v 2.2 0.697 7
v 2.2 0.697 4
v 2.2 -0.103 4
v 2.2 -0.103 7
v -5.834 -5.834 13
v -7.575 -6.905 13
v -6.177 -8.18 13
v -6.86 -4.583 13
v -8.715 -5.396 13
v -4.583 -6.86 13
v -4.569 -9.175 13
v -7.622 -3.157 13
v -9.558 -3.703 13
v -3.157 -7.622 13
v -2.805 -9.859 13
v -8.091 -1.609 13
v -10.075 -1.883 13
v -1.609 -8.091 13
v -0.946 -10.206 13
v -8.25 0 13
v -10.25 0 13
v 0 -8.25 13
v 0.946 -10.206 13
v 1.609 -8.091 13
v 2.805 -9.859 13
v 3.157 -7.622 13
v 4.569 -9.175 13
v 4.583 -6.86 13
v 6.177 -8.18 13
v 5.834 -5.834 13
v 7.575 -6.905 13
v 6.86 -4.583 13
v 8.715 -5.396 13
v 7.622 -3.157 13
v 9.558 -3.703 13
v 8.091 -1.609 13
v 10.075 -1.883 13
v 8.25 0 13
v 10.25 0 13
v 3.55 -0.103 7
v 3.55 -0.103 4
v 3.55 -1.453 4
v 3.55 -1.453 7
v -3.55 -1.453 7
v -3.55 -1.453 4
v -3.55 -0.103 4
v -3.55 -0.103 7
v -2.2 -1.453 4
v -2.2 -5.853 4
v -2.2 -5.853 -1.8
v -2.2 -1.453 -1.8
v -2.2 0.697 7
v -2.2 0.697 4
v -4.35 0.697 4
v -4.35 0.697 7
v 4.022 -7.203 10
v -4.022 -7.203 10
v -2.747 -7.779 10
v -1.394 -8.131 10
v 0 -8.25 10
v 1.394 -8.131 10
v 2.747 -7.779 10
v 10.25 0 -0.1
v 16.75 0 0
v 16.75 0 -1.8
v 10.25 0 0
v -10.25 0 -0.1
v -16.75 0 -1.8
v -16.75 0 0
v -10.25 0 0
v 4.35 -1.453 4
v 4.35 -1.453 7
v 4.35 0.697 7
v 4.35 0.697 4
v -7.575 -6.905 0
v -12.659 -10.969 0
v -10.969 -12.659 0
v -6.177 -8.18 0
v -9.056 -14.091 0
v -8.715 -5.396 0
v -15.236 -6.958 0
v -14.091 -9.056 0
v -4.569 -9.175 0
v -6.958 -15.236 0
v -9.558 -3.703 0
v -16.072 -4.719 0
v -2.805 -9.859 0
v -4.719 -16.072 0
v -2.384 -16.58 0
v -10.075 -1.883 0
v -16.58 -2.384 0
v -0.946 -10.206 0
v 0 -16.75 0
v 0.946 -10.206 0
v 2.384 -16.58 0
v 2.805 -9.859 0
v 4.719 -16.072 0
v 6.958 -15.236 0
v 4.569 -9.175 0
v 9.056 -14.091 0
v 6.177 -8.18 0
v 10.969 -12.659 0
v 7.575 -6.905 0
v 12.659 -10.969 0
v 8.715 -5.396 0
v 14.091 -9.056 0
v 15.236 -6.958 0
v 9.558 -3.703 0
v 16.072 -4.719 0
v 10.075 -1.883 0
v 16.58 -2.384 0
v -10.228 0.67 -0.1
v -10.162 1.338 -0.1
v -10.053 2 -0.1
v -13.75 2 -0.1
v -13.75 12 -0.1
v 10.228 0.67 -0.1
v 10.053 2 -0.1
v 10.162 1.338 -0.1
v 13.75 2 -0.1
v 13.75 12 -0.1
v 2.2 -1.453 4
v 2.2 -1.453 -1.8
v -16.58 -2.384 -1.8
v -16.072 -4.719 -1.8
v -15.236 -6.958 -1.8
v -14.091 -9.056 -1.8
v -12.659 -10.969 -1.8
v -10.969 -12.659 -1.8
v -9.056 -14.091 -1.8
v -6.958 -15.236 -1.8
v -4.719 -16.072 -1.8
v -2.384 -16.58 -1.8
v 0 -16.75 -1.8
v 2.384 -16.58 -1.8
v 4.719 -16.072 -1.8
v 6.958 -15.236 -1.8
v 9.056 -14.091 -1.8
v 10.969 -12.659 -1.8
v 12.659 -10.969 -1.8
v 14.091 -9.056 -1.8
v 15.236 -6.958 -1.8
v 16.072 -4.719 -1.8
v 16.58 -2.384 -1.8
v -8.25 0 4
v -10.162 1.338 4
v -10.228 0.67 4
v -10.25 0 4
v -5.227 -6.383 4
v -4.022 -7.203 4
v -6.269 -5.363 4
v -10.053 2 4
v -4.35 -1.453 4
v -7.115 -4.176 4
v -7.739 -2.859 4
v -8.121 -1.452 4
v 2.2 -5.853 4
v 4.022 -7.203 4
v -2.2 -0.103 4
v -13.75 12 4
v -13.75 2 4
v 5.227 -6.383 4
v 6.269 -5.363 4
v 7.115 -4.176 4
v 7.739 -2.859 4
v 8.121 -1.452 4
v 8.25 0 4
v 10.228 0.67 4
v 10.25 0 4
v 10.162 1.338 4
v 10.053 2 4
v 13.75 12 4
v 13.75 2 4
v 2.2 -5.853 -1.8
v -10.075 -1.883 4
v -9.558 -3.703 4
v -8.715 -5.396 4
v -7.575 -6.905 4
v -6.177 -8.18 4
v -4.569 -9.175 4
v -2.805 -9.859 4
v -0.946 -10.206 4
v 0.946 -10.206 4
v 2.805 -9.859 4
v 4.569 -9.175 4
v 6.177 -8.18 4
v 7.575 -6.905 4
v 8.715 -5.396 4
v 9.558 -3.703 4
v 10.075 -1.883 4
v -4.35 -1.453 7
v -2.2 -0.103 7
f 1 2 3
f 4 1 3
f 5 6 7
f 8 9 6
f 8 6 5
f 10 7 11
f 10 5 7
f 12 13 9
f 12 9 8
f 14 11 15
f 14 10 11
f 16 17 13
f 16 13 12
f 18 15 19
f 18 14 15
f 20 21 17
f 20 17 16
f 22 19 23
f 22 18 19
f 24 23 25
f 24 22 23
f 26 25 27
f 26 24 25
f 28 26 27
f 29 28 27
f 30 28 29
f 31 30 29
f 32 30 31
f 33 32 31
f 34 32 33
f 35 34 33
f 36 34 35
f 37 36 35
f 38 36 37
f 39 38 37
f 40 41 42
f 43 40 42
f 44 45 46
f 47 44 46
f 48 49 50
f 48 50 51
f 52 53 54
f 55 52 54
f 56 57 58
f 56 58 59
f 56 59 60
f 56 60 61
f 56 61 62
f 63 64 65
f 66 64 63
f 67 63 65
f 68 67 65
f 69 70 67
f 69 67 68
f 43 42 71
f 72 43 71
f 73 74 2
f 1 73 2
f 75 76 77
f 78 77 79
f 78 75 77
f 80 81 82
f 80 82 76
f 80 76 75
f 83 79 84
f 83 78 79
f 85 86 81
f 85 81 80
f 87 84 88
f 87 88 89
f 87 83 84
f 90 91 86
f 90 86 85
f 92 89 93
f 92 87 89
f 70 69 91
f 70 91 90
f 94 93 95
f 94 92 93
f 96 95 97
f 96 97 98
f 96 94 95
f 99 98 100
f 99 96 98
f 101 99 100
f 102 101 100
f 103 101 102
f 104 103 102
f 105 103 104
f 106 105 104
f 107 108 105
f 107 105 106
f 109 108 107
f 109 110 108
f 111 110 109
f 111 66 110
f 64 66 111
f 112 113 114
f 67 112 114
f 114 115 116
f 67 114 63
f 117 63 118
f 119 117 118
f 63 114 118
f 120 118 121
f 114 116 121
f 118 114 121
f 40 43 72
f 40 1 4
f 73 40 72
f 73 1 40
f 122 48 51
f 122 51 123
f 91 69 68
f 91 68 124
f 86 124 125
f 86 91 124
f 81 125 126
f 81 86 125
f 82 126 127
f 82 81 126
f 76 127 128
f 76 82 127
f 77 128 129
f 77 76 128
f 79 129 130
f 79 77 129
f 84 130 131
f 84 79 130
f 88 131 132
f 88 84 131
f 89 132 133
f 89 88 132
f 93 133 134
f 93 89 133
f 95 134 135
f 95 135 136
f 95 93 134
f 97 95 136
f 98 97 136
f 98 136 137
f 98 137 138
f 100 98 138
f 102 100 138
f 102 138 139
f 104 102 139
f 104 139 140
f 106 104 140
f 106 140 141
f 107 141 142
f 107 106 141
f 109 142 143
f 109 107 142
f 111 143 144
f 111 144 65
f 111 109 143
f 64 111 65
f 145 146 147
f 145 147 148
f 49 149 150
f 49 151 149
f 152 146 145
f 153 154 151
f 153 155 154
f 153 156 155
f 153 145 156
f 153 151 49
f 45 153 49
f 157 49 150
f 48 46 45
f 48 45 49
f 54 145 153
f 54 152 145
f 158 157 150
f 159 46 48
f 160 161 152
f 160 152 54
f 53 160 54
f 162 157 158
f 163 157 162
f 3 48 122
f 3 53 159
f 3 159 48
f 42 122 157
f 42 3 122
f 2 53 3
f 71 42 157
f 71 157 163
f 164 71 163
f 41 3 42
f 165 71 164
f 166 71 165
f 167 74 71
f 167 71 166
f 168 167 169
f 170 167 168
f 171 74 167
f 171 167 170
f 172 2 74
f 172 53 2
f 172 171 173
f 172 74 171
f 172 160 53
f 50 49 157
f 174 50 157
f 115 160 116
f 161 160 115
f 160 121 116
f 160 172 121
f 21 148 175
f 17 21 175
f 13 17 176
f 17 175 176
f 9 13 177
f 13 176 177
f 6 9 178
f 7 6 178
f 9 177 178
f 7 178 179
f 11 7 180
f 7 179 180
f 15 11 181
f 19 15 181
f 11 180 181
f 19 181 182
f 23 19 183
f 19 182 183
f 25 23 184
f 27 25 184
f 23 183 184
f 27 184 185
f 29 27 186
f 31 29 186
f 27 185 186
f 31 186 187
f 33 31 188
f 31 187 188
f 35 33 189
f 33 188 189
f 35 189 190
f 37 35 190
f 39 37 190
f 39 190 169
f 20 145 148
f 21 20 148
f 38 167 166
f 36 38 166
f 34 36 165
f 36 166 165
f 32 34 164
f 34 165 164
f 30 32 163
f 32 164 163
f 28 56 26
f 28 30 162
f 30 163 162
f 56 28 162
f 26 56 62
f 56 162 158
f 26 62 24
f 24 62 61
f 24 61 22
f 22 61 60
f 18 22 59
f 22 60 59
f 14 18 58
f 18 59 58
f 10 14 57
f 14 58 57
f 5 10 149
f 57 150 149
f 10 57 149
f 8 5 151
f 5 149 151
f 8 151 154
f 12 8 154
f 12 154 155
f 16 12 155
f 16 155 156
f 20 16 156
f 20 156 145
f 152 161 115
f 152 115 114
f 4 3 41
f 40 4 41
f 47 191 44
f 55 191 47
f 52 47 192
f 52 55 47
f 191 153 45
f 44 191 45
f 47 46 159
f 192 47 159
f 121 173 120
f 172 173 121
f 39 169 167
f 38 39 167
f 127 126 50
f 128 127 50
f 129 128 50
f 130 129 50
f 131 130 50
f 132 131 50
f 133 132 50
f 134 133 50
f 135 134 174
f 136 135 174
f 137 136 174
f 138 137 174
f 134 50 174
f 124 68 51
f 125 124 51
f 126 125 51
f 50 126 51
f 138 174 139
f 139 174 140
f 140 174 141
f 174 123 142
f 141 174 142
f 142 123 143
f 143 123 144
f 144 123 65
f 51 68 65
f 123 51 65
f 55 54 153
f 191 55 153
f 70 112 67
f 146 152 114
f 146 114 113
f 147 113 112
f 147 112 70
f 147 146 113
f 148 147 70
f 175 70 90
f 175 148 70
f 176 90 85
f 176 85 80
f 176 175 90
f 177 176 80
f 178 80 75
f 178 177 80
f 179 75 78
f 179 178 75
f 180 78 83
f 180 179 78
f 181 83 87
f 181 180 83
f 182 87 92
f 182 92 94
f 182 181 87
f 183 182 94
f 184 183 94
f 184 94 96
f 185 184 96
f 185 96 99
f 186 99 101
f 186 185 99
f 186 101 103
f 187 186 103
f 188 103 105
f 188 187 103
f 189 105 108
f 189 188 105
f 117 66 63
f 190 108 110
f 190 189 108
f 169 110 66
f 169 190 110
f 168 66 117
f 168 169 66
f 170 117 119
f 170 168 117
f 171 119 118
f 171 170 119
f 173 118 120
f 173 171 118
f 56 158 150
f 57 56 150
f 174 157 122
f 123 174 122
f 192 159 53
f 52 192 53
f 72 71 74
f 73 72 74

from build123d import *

# Parameters (mm, degrees)
F1_DEPTH      = 1.8
F2_DEPTH      = 4
F2_DEPTH_BACK = 0.1
F3_DEPTH      = 13
F3_DEPTH_BACK = 1.7
F4_W          = 4.4
F4_H          = 4.4
F5_DEPTH      = 10
F6_DEPTH      = 3
F7_DEPTH      = 6


with BuildPart() as f1:
    # F0 (on Top) → F1 (new body)
    with BuildSketch(Plane.XY):
        with BuildLine():
            Line((-13.75, 0), (-16.75, 0))
            ThreePointArc((-16.75, 0), (0, -16.75), (16.75, 0))
            Line((16.75, 0), (13.75, 0))
            Line((13.75, 0), (10.25, 0))
            ThreePointArc((10.25, 0), (0, -10.25), (-10.25, 0))
            Line((-10.25, 0), (-13.75, 0))
        make_face()
        with BuildLine():
            Line((-8.25, 0), (-10.25, 0))
            ThreePointArc((-10.25, 0), (0, -10.25), (10.25, 0))
            Line((10.25, 0), (8.25, 0))
            ThreePointArc((8.25, 0), (0, -8.25), (-8.25, 0))
        make_face()
        with BuildLine():
            Line((8.25, 0), (-8.25, 0))
            ThreePointArc((-8.25, 0), (0, -8.25), (8.25, 0))
        make_face()
    extrude(amount=-F1_DEPTH)

    # F0 (on Top) → F2 (join, two sides)
    with BuildSketch(Plane.XY) as f2_sk:
        with BuildLine():
            ThreePointArc((11.6859958925, 12), (12.7761141335, 10.8320546365), (13.75, 9.5655632349))
            Line((13.75, 9.5655632349), (13.75, 12))
            Line((13.75, 12), (11.6859958925, 12))
        make_face()
        with BuildLine():
            ThreePointArc((-10.0529846314, 2), (-10.2006272472, 1.0048401683), (-10.25, 0))
            Line((-10.25, 0), (-8.25, 0))
            ThreePointArc((-8.25, 0), (-8.1882451935, 1.0075418854), (-8.0039052968, 2))
            Line((-8.0039052968, 2), (-10.0529846314, 2))
        make_face()
        with BuildLine():
            ThreePointArc((-8.0039052968, 2), (-8.1882451935, 1.0075418854), (-8.25, 0))
            Line((-8.25, 0), (8.25, 0))
            ThreePointArc((8.25, 0), (8.1882451935, 1.0075418854), (8.0039052968, 2))
            Line((8.0039052968, 2), (-8.0039052968, 2))
        make_face()
        with BuildLine():
            Line((8.25, 0), (10.25, 0))
            ThreePointArc((10.25, 0), (10.2006272472, 1.0048401683), (10.0529846314, 2))
            Line((10.0529846314, 2), (8.0039052968, 2))
            ThreePointArc((8.0039052968, 2), (8.1882451935, 1.0075418854), (8.25, 0))
        make_face()
        with BuildLine():
            ThreePointArc((-11.6859958925, 12), (-12.7761141335, 10.8320546365), (-13.75, 9.5655632349))
            Line((-13.75, 9.5655632349), (-13.75, 2))
            Line((-13.75, 2), (-10.0529846314, 2))
            ThreePointArc((-10.0529846314, 2), (0, 10.25), (10.0529846314, 2))
            Line((10.0529846314, 2), (13.75, 2))
            Line((13.75, 2), (13.75, 9.5655632349))
            ThreePointArc((13.75, 9.5655632349), (12.7761141335, 10.8320546365), (11.6859958925, 12))
            Line((11.6859958925, 12), (-11.6859958925, 12))
        make_face()
        with BuildLine():
            Line((8.25, 0), (-8.25, 0))
            ThreePointArc((-8.25, 0), (0, -8.25), (8.25, 0))
        make_face()
        with BuildLine():
            Line((-8.25, 0), (-10.25, 0))
            ThreePointArc((-10.25, 0), (0, -10.25), (10.25, 0))
            Line((10.25, 0), (8.25, 0))
            ThreePointArc((8.25, 0), (0, -8.25), (-8.25, 0))
        make_face()
        with BuildLine():
            ThreePointArc((10.0529846314, 2), (0, 10.25), (-10.0529846314, 2))
            Line((-10.0529846314, 2), (-8.0039052968, 2))
            ThreePointArc((-8.0039052968, 2), (0, 8.25), (8.0039052968, 2))
            Line((8.0039052968, 2), (10.0529846314, 2))
        make_face()
        with BuildLine():
            ThreePointArc((8.0039052968, 2), (0, 8.25), (-8.0039052968, 2))
            Line((-8.0039052968, 2), (8.0039052968, 2))
        make_face()
        with BuildLine():
            Line((-13.75, 12), (-13.75, 9.5655632349))
            ThreePointArc((-13.75, 9.5655632349), (-12.7761141335, 10.8320546365), (-11.6859958925, 12))
            Line((-11.6859958925, 12), (-13.75, 12))
        make_face()
    extrude(amount=F2_DEPTH)
    extrude(f2_sk.sketch, amount=-F2_DEPTH_BACK)

    # F0 (on Top) → F3 (join, two sides)
    with BuildSketch(Plane.XY) as f3_sk:
        with BuildLine():
            Line((-8.25, 0), (-10.25, 0))
            ThreePointArc((-10.25, 0), (0, -10.25), (10.25, 0))
            Line((10.25, 0), (8.25, 0))
            ThreePointArc((8.25, 0), (0, -8.25), (-8.25, 0))
        make_face()
    extrude(amount=F3_DEPTH)
    extrude(f3_sk.sketch, amount=-F3_DEPTH_BACK)

    # F4 (on face) → F5 (cut)
    with BuildSketch(Plane.XY.offset(4)):
        with Locations((0, -3.653314048)):
            Rectangle(F4_W, F4_H)
    extrude(amount=-F5_DEPTH, mode=Mode.SUBTRACT)

    # F4 (on face) → F6 (join)
    with BuildSketch(Plane.XY.offset(4)):
        Polygon((-3.55, -0.103314048), (-2.2, -0.103314048), (-2.2, 0.696685952), (-4.35, 0.696685952), (-4.35, -1.453314048), (-3.55, -1.453314048), align=None)
        Polygon((2.2, -0.103314048), (3.55, -0.103314048), (3.55, -1.453314048), (4.35, -1.453314048), (4.35, 0.696685952), (2.2, 0.696685952), align=None)
    extrude(amount=F6_DEPTH)

    # F4 (on face) → F7 (join)
    with BuildSketch(Plane.XY.offset(4)):
        with BuildLine():
            Line((4.0217865093, -7.203314048), (3.55, -7.203314048))
            Line((3.55, -7.203314048), (-3.55, -7.203314048))
            Line((-3.55, -7.203314048), (-4.0217865093, -7.203314048))
            ThreePointArc((-4.0217865093, -7.203314048), (0, -8.25), (4.0217865093, -7.203314048))
        make_face()
    extrude(amount=F7_DEPTH)


solid = f1.part
